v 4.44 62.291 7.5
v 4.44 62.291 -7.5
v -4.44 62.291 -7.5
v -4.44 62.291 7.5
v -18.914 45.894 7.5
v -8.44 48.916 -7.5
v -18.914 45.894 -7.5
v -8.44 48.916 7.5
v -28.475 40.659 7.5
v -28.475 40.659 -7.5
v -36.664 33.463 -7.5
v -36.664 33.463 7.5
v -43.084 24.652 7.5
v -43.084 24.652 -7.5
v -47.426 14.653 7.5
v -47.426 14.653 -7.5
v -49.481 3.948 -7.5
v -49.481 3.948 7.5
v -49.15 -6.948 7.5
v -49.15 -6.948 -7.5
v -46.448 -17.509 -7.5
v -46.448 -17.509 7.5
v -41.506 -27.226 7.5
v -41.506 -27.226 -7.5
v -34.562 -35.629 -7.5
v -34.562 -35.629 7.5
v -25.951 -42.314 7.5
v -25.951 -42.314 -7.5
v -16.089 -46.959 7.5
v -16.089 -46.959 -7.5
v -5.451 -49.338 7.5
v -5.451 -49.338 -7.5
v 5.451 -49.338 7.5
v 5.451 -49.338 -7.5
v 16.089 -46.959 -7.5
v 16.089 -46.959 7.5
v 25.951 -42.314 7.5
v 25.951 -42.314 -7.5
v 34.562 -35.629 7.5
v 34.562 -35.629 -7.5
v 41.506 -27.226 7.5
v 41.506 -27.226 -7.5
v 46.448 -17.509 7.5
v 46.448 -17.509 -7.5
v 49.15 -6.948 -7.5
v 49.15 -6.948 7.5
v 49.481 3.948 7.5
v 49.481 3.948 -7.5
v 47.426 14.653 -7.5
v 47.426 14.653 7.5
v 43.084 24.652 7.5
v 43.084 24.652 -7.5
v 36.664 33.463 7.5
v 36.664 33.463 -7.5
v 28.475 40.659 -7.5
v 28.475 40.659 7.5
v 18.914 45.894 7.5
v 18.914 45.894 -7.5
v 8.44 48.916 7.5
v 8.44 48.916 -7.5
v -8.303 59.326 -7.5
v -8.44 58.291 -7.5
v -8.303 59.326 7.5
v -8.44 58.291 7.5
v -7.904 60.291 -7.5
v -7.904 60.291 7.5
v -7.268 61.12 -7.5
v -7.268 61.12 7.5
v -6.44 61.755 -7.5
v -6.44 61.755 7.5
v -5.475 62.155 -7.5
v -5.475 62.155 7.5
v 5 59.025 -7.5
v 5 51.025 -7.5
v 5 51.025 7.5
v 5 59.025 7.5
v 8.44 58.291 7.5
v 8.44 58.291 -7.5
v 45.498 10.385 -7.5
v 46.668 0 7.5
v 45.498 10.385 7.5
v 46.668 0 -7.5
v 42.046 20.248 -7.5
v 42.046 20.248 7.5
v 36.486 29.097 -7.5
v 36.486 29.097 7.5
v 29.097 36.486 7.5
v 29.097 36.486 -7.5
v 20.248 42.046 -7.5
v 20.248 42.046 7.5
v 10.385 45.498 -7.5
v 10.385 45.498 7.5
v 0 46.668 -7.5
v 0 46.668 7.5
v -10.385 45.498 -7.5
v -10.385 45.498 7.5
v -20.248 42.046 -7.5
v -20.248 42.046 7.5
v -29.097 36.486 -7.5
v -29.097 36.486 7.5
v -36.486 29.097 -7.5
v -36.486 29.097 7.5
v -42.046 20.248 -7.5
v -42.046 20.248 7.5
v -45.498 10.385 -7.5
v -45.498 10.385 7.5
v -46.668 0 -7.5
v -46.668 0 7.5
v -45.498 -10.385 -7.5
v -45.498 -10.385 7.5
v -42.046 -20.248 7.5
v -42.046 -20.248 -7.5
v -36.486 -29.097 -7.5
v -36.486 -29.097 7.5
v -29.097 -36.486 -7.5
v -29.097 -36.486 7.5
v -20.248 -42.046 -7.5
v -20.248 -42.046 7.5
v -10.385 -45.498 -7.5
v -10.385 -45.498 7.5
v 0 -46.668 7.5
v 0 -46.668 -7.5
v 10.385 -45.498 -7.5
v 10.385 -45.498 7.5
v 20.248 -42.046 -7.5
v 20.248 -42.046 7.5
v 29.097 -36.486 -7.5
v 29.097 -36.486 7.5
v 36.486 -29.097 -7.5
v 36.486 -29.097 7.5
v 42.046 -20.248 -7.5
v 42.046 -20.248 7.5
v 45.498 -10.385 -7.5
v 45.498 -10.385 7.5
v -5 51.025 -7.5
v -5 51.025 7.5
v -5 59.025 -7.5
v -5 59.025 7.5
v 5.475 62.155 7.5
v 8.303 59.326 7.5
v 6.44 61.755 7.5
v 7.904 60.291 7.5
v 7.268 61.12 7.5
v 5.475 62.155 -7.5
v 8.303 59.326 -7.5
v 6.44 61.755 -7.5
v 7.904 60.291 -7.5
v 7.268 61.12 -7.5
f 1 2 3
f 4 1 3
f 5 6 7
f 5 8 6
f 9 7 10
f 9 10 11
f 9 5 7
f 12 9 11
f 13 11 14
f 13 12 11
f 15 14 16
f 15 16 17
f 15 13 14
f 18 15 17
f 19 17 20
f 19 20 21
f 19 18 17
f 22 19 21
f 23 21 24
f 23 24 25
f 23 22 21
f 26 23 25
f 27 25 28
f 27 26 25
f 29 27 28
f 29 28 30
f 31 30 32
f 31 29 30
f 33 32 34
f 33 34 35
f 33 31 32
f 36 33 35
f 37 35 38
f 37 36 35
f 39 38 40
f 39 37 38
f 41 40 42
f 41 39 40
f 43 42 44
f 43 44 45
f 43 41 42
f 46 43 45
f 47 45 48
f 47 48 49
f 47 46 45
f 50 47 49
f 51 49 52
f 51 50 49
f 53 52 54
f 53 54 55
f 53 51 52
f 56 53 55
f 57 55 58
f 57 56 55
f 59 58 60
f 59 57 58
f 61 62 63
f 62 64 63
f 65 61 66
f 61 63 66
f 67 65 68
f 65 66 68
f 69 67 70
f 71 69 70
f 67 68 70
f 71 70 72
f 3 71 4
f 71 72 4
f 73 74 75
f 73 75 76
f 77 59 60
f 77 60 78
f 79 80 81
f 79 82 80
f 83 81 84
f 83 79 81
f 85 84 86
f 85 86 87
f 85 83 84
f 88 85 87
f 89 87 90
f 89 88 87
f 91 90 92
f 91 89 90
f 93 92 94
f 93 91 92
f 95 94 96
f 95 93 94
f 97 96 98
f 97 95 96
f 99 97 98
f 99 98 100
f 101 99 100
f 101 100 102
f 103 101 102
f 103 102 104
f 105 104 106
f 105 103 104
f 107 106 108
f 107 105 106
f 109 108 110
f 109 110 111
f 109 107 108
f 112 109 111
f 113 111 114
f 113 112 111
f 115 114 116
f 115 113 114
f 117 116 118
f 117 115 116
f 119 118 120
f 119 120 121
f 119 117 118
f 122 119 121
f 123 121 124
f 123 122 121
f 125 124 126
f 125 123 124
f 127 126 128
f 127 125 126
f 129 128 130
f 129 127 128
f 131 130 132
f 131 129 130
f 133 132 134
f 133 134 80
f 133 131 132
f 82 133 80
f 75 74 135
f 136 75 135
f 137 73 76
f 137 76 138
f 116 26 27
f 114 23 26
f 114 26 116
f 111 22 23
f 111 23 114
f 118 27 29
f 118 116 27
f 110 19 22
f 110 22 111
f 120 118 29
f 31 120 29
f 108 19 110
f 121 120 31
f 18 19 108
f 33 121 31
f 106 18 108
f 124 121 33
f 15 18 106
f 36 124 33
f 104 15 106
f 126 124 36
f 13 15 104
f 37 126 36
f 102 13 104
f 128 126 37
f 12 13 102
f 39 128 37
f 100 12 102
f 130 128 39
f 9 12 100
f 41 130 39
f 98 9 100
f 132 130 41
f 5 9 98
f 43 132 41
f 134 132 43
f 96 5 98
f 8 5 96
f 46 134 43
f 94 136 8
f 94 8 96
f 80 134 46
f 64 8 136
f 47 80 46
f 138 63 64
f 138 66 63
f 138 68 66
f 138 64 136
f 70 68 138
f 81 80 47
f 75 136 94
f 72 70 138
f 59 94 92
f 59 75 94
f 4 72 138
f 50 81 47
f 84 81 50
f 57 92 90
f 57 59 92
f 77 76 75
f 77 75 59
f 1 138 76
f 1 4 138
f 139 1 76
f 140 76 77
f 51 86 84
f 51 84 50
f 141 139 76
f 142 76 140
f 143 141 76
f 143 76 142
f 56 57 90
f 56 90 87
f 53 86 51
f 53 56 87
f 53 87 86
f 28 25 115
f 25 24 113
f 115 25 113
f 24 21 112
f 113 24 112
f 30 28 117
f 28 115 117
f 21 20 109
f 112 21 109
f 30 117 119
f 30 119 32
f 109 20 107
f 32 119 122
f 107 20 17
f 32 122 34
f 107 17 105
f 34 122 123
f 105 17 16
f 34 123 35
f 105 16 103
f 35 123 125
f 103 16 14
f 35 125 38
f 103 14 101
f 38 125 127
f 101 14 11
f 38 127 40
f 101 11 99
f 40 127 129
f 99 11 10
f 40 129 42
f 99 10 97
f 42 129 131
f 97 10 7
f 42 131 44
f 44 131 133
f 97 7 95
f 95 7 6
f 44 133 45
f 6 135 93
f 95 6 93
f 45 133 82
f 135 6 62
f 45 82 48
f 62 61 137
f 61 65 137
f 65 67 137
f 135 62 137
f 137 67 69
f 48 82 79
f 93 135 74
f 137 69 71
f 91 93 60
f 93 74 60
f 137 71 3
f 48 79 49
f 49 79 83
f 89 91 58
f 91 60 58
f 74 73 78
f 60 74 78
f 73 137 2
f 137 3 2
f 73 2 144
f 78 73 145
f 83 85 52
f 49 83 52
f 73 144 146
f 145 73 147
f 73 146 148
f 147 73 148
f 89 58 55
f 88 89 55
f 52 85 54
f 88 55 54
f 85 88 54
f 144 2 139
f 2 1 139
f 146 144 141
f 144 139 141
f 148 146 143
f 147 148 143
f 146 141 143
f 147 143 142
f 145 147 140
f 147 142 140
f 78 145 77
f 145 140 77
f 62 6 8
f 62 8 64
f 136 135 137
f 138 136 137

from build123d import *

# Parameters (mm, degrees)
SKETCH1_R           = 49.638488844
SKETCH1_R_2         = 46.667664218
BOSS_EXTRUDE1_DEPTH = 7.5
SKETCH2_W           = 16.879419562
SKETCH2_H           = 14.533093082
SKETCH2_W_2         = 10
SKETCH2_H_2         = 8
BOSS_EXTRUDE2_DEPTH = 15
FILLET1_R           = 4


with BuildPart() as part:
    # Sketch1 → Boss-Extrude1 (new, symmetric)
    with BuildSketch(Plane.XY):
        Circle(SKETCH1_R)
        Circle(SKETCH1_R_2, mode=Mode.SUBTRACT)
    extrude(amount=BOSS_EXTRUDE1_DEPTH, both=True)

    # Sketch2 → Boss-Extrude2 (add)
    with BuildSketch(Plane(origin=(0, 0, -7.5), x_dir=(-1, 0, 0), z_dir=(0, 0, -1))):
        with Locations((0, 55.024649482)):
            Rectangle(SKETCH2_W, SKETCH2_H)
        with Locations((0, 55.024649482)):
            Rectangle(SKETCH2_W_2, SKETCH2_H_2, mode=Mode.SUBTRACT)
    extrude(amount=-BOSS_EXTRUDE2_DEPTH)

    # Fillet1
    fillet1_edges = [part.edges().sort_by_distance(p)[0] for p in [
        (-8.439709781, 62.291196023, 0),
        (8.439709781, 62.291196023, 0),
    ]]
    fillet(fillet1_edges, radius=FILLET1_R)


solid = part.part
